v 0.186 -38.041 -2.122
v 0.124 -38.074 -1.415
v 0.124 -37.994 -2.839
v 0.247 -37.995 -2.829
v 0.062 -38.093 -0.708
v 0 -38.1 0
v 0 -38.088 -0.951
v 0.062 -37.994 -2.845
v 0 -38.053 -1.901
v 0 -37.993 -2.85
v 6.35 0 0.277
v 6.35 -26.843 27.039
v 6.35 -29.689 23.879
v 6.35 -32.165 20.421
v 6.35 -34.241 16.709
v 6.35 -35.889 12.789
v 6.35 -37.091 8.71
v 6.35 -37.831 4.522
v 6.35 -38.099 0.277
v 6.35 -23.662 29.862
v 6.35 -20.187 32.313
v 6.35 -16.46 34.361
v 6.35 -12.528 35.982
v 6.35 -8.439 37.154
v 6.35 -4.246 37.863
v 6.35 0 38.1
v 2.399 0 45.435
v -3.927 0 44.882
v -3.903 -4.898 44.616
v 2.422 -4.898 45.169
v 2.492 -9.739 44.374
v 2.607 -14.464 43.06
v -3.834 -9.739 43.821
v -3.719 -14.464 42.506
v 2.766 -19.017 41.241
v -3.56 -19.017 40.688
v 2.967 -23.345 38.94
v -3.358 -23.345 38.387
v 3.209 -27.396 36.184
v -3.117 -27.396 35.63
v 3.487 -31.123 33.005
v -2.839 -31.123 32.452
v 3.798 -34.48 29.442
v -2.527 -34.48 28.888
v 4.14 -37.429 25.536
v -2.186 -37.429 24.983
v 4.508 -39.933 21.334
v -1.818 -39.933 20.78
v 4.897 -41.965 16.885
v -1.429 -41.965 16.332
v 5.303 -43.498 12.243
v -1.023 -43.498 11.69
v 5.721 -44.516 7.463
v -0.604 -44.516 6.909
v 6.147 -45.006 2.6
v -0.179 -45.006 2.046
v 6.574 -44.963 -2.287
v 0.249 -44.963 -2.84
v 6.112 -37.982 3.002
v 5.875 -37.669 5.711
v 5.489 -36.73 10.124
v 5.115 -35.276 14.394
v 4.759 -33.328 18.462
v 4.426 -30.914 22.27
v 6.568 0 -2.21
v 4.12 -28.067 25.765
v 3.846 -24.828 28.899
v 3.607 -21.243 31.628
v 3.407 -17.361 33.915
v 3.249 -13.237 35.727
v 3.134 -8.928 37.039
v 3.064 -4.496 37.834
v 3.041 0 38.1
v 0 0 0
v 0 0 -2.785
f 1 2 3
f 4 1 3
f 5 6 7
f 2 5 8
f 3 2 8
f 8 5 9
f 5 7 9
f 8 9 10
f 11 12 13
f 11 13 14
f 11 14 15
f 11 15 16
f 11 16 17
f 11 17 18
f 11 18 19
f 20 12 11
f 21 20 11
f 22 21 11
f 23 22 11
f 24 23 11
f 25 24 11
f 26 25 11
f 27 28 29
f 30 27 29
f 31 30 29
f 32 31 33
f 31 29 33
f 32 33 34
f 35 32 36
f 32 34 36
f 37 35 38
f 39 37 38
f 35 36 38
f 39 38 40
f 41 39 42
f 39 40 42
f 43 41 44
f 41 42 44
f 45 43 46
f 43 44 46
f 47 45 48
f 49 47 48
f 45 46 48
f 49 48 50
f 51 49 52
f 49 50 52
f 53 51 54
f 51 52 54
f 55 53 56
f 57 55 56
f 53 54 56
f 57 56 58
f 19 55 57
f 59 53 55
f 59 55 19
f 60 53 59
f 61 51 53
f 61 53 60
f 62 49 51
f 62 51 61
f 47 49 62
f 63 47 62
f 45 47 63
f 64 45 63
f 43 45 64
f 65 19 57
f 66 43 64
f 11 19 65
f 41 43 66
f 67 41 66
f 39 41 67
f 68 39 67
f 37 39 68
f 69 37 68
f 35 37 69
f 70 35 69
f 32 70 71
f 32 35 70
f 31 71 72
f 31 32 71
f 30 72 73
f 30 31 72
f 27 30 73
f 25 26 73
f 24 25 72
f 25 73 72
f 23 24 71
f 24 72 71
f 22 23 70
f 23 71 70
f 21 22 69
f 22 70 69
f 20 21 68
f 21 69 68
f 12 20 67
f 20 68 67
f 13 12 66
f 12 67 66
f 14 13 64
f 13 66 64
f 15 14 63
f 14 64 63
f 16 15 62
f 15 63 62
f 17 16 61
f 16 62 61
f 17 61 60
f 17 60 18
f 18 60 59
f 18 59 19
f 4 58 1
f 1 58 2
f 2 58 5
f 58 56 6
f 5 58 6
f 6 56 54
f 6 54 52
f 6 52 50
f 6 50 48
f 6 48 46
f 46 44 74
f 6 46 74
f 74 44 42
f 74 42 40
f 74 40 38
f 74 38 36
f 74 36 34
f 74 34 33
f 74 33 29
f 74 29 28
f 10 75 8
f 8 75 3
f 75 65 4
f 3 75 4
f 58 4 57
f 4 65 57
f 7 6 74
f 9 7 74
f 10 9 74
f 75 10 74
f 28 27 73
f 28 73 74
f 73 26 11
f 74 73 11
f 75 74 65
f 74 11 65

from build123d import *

# Parameters (mm, degrees)
F0_R     = 38.1
F1_DEPTH = 6.35
F4_R     = 45.0533398
F5_DEPTH = 6.35
F9_DEPTH = 50.8


with BuildPart() as f1:
    # F0 (on Right) → F1 (new body)
    with BuildSketch(Plane.YZ):
        Circle(F0_R)
    extrude(amount=F1_DEPTH)

    # F4 (on line) → F5 (join)
    with BuildSketch(Plane(origin=(0, 0, 0), x_dir=(0, 1, 0), z_dir=(0.9961946981, 0, 0.0871557427))):
        Circle(F4_R)
    extrude(amount=F5_DEPTH)

    # F8 (on offset) → F9 (cut)
    with BuildSketch(Plane(origin=(31.6291816644, 0, 2.7671948322), x_dir=(0, 1, 0), z_dir=(0.9961946981, 0, 0.0871557427))):
        Polygon((0, 54.2062856257), (0, -2.7743342798), (-63.262976706, -2.8825730551), (-87.0150923729, -54.4917583466), (75.6417736411, -57.2080314159), (68.2347118855, 54.2062856257), align=None)
    extrude(amount=-F9_DEPTH, mode=Mode.SUBTRACT)


solid = f1.part
